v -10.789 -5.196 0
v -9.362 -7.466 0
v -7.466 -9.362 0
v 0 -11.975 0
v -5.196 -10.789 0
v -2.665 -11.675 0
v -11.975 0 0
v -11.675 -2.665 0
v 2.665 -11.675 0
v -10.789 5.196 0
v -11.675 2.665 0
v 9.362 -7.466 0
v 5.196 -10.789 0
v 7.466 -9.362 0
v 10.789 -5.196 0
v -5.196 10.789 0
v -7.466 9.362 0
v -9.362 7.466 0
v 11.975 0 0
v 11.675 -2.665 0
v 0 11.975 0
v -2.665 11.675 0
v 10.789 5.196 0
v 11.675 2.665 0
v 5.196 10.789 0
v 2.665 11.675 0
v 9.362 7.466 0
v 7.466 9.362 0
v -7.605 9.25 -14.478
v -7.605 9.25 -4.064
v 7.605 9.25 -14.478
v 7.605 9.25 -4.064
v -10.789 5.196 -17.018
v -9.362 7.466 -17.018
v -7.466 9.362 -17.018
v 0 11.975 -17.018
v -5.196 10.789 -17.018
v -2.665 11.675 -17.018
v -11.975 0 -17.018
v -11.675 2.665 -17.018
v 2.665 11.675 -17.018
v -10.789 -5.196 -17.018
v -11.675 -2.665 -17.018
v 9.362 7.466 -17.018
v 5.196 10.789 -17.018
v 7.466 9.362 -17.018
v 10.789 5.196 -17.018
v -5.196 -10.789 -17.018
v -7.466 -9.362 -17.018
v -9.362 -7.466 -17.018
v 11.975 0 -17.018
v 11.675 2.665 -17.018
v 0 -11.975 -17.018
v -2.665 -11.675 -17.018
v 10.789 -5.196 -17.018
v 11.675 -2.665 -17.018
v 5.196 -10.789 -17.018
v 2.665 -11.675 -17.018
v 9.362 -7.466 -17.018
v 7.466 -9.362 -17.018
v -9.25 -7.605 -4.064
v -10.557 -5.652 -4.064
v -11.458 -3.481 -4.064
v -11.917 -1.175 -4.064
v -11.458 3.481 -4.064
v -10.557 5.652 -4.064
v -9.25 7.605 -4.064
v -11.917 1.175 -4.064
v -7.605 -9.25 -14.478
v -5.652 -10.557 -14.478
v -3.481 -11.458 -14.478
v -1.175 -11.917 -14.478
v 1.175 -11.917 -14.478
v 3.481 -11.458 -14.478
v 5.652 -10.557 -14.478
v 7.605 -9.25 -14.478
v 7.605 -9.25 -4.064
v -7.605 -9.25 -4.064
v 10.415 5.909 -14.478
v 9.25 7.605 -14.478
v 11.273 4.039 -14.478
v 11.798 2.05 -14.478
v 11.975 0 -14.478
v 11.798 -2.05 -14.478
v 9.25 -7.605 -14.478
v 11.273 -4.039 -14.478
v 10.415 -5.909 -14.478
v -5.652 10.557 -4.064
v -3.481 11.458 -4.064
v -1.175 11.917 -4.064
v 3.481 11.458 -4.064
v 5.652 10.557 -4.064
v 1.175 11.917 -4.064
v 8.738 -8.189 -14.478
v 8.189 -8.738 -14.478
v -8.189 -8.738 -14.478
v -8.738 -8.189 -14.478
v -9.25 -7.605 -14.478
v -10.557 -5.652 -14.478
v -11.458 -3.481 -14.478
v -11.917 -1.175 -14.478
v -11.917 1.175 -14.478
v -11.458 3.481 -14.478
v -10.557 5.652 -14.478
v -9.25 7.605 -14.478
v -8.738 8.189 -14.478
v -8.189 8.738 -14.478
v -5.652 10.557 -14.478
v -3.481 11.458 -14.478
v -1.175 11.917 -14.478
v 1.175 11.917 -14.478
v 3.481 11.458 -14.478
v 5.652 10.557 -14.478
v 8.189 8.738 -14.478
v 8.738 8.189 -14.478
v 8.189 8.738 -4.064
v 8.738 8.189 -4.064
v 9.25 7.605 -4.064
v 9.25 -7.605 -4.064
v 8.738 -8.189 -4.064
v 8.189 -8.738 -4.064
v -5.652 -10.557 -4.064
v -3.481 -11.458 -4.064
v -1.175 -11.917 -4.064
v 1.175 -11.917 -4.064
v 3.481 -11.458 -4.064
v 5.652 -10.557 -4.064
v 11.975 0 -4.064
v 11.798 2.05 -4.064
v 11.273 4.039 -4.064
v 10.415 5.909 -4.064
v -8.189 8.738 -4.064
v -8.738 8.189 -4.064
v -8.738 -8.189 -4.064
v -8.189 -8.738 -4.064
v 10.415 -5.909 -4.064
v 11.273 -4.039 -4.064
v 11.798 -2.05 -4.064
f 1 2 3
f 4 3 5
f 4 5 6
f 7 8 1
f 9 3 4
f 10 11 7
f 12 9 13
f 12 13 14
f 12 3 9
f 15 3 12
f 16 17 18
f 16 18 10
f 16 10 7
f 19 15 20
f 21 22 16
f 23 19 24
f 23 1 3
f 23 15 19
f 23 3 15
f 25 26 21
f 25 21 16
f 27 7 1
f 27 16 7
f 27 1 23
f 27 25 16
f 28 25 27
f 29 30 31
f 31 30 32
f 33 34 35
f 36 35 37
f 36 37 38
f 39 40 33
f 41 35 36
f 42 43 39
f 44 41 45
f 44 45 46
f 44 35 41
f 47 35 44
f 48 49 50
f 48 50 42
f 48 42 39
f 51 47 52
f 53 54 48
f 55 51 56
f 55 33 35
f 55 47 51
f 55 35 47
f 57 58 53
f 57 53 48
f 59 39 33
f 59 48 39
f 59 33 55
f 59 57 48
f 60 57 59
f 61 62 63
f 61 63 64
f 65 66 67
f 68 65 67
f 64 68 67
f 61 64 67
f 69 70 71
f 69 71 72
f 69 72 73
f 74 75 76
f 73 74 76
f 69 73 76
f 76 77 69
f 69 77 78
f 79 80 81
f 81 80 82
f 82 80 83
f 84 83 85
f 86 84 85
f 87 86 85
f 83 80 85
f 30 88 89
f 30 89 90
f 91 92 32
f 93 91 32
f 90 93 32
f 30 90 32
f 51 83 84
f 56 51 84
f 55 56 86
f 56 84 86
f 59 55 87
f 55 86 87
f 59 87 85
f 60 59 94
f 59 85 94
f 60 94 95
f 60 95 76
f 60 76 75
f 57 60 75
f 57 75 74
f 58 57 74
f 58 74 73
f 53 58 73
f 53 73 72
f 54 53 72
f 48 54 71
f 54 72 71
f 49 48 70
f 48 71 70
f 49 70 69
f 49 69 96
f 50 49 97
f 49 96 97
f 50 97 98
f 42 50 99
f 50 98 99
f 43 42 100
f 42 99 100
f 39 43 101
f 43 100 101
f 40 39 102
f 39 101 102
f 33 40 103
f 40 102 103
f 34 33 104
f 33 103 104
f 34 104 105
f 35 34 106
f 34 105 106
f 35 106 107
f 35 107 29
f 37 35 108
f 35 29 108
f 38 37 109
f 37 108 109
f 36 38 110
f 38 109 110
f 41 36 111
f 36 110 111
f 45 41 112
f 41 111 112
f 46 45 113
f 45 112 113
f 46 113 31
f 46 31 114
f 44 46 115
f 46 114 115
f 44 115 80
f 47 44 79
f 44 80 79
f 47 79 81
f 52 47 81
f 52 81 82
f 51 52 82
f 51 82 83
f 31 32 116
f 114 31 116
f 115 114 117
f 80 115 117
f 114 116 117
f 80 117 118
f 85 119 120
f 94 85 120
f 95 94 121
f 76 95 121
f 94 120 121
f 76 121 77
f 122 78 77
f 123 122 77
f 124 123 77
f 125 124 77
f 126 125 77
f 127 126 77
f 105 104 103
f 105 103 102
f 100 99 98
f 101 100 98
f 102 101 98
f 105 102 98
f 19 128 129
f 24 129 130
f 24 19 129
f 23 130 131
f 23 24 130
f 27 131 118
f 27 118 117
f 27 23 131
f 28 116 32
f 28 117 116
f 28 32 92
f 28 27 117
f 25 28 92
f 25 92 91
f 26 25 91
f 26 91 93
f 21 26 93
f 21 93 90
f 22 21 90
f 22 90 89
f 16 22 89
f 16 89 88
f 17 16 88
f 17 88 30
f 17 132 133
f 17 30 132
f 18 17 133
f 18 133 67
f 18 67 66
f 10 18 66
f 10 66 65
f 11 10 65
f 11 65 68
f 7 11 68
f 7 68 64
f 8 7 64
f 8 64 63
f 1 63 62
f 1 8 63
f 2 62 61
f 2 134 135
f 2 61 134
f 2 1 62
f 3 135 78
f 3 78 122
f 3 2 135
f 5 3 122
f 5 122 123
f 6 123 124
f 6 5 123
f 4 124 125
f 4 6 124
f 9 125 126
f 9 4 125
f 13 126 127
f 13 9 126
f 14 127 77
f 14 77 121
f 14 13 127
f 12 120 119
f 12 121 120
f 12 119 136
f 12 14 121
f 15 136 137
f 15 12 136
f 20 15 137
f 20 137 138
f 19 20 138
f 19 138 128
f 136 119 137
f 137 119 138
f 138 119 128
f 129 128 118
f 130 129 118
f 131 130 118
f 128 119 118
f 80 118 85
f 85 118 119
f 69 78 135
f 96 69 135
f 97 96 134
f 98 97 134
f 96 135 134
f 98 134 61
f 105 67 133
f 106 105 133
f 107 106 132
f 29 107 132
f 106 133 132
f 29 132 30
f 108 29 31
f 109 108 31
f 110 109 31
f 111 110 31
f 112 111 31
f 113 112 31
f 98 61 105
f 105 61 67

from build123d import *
from build123d.topology import SkipClean

# Parameters (mm, degrees)
SKETCH1_R           = 11.975000032
BOSS_EXTRUDE1_DEPTH = 4.064
BOSS_EXTRUDE2_DEPTH = 10.414
SKETCH3_R           = 11.975000032
BOSS_EXTRUDE3_DEPTH = 2.54


with BuildPart() as part:
    # Sketch1 → Boss-Extrude1 (new body)
    with BuildSketch(Plane.XY):
        Circle(SKETCH1_R)
    extrude(amount=-BOSS_EXTRUDE1_DEPTH)

    # Sketch2 → Boss-Extrude2 (add)
    with SkipClean():  # the faces are left unmerged after this step: merging them gives an invalid solid
        with BuildSketch(Plane(origin=(0, 0, -4.064), x_dir=(-1, 0, 0), z_dir=(0, 0, -1))):
            with BuildLine():
                ThreePointArc((9.250000032, 7.605138077), (8.467603727, 8.467603727), (7.605138077, 9.250000032))
                Line((7.605138077, 9.250000032), (-7.605138077, 9.250000032))
                ThreePointArc((-7.605138077, 9.250000032), (-8.467603727, 8.467603727), (-9.250000032, 7.605138077))
                Line((-9.250000032, 7.605138077), (-9.250000032, -7.605138077))
                ThreePointArc((-9.250000032, -7.605138077), (-8.467603727, -8.467603727), (-7.605138077, -9.250000032))
                Line((-7.605138077, -9.250000032), (7.605138077, -9.250000032))
                ThreePointArc((7.605138077, -9.250000032), (8.467603727, -8.467603727), (9.250000032, -7.605138077))
                Line((9.250000032, -7.605138077), (9.250000032, 7.605138077))
            make_face()
        extrude(amount=BOSS_EXTRUDE2_DEPTH)

    # Sketch3 → Boss-Extrude3 (add)
    with BuildSketch(Plane(origin=(0, 0, -14.478), x_dir=(-1, 0, 0), z_dir=(0, 0, -1))):
        Circle(SKETCH3_R)
    extrude(amount=BOSS_EXTRUDE3_DEPTH)


solid = part.part
